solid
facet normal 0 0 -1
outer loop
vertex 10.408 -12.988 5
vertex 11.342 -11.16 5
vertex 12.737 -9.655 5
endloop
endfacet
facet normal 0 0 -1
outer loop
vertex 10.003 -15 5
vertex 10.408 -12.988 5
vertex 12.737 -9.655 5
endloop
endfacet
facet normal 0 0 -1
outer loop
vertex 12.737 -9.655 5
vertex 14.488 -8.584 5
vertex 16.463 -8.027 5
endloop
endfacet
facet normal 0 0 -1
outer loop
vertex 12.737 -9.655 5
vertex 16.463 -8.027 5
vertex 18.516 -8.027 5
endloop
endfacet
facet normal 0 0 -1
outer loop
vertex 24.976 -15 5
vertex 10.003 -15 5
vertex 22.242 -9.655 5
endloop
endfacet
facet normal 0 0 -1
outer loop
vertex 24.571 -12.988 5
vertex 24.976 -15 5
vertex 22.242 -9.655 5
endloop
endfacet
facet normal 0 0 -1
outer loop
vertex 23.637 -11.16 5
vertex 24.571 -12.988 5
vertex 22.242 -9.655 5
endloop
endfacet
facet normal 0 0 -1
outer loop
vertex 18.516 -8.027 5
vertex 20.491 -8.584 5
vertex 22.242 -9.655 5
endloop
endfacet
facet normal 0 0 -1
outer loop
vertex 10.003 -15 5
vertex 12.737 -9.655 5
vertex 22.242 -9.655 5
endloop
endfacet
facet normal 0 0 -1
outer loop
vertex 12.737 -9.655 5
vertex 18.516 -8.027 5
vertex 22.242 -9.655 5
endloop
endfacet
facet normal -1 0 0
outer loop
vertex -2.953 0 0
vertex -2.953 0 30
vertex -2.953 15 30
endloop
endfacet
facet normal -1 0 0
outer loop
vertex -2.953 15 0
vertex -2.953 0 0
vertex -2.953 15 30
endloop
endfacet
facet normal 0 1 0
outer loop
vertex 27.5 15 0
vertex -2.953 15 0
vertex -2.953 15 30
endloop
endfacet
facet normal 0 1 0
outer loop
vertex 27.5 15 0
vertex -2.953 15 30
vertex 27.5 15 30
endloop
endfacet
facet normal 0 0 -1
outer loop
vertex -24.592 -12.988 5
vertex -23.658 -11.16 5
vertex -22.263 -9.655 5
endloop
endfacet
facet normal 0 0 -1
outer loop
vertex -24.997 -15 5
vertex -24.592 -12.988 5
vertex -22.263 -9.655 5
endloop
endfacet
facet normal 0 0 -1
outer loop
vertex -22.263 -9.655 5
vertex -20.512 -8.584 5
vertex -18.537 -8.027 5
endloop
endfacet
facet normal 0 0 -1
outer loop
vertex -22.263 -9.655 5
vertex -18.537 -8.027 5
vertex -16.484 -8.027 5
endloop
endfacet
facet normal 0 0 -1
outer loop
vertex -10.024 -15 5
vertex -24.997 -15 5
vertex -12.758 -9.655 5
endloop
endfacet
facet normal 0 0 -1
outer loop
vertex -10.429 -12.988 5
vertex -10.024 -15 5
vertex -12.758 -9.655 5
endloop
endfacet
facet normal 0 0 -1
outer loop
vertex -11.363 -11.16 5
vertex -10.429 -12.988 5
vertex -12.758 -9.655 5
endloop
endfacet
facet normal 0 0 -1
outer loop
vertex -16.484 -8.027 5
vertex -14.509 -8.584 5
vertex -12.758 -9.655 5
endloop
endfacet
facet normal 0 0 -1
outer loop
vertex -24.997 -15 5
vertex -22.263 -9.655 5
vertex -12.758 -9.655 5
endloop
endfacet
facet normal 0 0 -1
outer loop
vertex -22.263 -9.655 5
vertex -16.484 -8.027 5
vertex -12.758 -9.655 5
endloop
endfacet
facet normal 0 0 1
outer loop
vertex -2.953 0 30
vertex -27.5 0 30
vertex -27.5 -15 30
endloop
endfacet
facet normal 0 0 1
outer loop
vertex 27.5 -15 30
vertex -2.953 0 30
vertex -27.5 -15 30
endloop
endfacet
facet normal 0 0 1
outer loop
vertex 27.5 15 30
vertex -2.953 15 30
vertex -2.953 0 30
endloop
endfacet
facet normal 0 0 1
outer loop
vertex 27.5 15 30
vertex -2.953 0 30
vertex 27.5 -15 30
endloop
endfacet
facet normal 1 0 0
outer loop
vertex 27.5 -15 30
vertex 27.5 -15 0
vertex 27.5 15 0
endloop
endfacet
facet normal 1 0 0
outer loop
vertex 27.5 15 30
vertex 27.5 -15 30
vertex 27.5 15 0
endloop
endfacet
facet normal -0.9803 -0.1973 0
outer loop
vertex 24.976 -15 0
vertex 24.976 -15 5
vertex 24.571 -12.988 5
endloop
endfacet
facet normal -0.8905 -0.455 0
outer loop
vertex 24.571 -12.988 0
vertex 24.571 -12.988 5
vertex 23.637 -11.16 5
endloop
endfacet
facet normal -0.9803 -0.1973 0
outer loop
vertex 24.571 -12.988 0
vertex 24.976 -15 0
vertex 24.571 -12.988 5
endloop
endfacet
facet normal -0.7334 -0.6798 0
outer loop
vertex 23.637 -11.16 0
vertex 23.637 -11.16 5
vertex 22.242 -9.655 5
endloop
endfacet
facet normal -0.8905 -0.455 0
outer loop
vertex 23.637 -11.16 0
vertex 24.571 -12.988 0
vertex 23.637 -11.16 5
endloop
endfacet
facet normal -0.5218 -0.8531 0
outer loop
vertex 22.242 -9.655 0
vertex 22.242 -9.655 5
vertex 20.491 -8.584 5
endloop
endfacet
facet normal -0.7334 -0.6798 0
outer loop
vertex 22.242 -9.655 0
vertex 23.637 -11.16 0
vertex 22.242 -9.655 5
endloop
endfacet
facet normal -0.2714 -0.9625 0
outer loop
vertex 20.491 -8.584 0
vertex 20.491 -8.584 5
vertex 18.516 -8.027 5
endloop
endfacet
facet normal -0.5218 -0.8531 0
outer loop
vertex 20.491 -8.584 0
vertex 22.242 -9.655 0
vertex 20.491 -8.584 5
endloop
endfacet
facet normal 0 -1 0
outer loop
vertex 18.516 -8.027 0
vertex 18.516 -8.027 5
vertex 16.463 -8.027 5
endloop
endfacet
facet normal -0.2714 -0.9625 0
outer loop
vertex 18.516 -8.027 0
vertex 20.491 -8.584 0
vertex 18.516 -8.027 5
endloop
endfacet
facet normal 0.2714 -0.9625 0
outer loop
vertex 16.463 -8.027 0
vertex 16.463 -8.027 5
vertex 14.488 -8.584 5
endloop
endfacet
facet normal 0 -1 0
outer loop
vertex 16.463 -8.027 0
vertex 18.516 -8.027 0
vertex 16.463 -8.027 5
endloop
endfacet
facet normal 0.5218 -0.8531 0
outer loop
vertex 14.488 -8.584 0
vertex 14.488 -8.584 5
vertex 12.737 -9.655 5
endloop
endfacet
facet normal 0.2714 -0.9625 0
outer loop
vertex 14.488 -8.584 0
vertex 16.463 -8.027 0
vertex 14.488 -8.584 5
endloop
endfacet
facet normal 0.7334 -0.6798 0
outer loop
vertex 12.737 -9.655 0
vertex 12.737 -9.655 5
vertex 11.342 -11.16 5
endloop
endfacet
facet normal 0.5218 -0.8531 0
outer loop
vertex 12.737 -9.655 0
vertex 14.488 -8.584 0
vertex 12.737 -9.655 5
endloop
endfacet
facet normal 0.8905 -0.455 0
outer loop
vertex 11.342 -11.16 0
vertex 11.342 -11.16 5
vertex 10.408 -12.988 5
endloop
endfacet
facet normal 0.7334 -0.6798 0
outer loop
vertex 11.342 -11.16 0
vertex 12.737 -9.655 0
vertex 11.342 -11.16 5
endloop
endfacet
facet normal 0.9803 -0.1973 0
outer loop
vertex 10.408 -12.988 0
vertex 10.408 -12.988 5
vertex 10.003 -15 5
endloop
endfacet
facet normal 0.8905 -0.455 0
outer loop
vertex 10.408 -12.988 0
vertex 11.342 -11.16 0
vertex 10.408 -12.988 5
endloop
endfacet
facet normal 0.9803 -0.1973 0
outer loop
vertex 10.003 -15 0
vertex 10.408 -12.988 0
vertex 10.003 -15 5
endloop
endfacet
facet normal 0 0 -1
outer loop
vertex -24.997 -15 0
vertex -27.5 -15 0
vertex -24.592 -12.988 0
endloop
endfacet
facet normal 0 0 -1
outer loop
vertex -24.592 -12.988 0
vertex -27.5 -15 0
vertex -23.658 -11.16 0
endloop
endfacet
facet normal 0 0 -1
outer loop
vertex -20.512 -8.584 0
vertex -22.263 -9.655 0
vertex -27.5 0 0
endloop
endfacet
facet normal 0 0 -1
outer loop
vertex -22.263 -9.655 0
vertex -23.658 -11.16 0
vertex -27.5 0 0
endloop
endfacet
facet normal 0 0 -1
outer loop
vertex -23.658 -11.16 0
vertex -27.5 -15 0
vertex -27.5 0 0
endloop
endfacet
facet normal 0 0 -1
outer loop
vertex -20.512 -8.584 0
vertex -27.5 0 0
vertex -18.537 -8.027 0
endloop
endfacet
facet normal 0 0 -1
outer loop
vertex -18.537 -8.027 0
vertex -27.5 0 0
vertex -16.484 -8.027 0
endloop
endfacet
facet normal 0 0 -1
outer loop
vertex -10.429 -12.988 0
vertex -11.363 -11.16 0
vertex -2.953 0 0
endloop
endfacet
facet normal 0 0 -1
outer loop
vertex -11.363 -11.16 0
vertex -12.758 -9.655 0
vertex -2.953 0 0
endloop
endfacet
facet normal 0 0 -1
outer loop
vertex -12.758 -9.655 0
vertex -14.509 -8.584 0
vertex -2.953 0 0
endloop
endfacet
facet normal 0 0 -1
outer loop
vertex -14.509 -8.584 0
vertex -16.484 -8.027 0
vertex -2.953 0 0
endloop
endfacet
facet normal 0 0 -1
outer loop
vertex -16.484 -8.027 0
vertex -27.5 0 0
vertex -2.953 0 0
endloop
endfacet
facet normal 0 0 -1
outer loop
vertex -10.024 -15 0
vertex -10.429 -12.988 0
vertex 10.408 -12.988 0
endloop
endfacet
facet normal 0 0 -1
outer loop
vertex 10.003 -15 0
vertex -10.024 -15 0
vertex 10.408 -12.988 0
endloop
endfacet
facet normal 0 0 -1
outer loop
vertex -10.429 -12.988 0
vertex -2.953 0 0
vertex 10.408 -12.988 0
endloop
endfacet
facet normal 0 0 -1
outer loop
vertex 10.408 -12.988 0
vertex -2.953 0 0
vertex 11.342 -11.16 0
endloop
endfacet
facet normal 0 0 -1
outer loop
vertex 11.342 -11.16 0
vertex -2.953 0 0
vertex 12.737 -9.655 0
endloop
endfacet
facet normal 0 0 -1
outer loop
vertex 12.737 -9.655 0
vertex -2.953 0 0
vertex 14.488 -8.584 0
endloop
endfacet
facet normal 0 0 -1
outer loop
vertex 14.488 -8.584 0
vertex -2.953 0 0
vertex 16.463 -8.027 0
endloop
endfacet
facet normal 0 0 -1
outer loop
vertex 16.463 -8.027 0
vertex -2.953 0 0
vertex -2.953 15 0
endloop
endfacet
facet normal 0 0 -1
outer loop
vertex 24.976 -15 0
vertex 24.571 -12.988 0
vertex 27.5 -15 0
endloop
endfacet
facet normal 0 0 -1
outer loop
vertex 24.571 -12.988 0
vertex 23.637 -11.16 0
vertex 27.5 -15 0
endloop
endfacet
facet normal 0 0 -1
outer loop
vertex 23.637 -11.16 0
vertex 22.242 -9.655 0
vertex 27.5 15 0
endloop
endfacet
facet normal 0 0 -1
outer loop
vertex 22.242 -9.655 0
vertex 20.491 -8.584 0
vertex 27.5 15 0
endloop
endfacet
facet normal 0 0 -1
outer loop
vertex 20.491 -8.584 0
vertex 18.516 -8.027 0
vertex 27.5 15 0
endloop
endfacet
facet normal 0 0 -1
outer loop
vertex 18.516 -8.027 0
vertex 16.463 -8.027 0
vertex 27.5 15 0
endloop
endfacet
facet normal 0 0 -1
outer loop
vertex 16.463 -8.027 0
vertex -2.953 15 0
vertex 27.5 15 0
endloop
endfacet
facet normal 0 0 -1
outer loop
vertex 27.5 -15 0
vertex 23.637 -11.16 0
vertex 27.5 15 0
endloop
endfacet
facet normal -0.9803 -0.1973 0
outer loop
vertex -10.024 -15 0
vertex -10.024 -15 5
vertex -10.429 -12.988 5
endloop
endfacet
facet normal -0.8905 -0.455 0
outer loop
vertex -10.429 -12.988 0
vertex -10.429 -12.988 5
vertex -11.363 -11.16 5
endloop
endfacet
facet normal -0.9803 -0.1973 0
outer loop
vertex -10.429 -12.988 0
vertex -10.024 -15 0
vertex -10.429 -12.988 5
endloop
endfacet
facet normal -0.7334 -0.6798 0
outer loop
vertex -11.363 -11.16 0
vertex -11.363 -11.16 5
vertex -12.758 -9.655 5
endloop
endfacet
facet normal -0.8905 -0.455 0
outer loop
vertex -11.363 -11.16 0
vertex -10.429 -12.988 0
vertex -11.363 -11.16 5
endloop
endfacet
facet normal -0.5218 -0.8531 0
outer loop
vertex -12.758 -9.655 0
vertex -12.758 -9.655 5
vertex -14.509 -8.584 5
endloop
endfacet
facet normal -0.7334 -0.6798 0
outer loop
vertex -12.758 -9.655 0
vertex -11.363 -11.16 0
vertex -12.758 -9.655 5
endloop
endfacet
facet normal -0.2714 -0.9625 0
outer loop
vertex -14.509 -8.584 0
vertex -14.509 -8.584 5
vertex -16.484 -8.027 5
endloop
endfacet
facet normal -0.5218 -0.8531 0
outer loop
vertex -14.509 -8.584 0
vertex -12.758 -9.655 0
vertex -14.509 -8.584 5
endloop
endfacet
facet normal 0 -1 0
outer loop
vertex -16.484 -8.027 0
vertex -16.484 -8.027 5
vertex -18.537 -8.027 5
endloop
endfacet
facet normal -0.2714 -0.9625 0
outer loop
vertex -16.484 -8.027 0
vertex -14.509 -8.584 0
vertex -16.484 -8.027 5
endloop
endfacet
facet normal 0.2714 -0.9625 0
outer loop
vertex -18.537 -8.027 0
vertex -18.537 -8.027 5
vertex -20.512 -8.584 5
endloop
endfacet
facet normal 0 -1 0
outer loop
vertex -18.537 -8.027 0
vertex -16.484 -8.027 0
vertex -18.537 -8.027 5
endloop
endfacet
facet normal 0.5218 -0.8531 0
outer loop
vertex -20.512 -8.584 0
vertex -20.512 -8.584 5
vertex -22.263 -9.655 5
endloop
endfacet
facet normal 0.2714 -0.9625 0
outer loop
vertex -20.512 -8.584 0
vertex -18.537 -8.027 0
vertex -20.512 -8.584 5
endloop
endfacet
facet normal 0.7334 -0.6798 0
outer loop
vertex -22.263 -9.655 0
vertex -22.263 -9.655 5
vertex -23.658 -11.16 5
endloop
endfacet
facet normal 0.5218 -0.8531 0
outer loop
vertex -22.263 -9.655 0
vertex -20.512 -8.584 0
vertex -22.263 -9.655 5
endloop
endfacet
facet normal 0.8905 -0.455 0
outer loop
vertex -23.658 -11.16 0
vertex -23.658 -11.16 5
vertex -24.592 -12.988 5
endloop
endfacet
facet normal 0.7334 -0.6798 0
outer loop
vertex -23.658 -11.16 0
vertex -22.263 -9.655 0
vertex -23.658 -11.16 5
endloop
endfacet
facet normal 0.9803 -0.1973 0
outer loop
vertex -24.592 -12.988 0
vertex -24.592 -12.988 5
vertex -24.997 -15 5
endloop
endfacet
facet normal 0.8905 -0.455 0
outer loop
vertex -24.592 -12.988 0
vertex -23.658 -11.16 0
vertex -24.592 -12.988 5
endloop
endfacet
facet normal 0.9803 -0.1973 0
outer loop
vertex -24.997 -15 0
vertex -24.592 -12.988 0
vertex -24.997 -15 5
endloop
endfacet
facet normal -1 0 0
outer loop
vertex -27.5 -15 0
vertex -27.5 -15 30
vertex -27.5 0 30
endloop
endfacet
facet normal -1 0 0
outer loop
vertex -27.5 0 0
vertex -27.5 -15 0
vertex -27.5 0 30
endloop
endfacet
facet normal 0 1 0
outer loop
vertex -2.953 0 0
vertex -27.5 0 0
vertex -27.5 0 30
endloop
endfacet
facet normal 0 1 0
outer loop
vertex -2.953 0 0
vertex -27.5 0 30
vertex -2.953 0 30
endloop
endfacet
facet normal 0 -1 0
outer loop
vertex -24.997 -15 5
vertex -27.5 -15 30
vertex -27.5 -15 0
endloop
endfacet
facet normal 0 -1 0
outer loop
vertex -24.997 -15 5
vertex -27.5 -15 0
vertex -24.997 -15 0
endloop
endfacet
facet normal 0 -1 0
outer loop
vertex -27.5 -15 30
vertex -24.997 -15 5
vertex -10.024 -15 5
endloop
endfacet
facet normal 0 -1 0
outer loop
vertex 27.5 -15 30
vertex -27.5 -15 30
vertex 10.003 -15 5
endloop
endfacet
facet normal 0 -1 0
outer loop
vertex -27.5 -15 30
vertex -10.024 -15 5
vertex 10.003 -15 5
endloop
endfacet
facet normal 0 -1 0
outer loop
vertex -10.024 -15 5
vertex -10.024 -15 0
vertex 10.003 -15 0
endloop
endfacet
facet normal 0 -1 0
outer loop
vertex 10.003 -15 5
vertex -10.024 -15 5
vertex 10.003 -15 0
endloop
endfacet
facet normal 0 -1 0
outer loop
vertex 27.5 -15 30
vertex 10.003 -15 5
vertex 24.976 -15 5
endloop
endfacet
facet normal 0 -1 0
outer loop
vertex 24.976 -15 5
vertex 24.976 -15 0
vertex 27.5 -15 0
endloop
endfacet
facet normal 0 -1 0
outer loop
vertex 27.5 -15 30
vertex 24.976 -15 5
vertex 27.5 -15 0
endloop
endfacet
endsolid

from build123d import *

# Parameters (mm, degrees)
F0_W     = 55
F0_H     = 30
F1_DEPTH = 30
F2_W     = 25.139422
F2_H     = 16
F3_DEPTH = 67.1
F4_R     = 7.5
F5_DEPTH = 5
F6_DEPTH = 5


with BuildPart() as f1:
    # F0 (on Top) → F1 (new body)
    with BuildSketch(Plane.XY):
        Rectangle(F0_W, F0_H)
    extrude(amount=F1_DEPTH)

    # F2 (on Top) → F3 (cut)
    with BuildSketch(Plane.XY):
        with Locations((-15.522837, 8)):
            Rectangle(F2_W, F2_H)
    extrude(amount=F3_DEPTH, mode=Mode.SUBTRACT)

    # F4 (on Top) → F5 (cut)
    with BuildSketch(Plane.XY):
        with Locations((17.489556, -15.456908)):
            Circle(F4_R)
    extrude(amount=F5_DEPTH, mode=Mode.SUBTRACT)

    # F4 (on Top) → F6 (cut)
    with BuildSketch(Plane.XY):
        with Locations((-17.510444, -15.456908)):
            Circle(F4_R)
        with Locations((17.489556, -15.456908)):
            Circle(F4_R)
    extrude(amount=F6_DEPTH, mode=Mode.SUBTRACT)


solid = f1.part
